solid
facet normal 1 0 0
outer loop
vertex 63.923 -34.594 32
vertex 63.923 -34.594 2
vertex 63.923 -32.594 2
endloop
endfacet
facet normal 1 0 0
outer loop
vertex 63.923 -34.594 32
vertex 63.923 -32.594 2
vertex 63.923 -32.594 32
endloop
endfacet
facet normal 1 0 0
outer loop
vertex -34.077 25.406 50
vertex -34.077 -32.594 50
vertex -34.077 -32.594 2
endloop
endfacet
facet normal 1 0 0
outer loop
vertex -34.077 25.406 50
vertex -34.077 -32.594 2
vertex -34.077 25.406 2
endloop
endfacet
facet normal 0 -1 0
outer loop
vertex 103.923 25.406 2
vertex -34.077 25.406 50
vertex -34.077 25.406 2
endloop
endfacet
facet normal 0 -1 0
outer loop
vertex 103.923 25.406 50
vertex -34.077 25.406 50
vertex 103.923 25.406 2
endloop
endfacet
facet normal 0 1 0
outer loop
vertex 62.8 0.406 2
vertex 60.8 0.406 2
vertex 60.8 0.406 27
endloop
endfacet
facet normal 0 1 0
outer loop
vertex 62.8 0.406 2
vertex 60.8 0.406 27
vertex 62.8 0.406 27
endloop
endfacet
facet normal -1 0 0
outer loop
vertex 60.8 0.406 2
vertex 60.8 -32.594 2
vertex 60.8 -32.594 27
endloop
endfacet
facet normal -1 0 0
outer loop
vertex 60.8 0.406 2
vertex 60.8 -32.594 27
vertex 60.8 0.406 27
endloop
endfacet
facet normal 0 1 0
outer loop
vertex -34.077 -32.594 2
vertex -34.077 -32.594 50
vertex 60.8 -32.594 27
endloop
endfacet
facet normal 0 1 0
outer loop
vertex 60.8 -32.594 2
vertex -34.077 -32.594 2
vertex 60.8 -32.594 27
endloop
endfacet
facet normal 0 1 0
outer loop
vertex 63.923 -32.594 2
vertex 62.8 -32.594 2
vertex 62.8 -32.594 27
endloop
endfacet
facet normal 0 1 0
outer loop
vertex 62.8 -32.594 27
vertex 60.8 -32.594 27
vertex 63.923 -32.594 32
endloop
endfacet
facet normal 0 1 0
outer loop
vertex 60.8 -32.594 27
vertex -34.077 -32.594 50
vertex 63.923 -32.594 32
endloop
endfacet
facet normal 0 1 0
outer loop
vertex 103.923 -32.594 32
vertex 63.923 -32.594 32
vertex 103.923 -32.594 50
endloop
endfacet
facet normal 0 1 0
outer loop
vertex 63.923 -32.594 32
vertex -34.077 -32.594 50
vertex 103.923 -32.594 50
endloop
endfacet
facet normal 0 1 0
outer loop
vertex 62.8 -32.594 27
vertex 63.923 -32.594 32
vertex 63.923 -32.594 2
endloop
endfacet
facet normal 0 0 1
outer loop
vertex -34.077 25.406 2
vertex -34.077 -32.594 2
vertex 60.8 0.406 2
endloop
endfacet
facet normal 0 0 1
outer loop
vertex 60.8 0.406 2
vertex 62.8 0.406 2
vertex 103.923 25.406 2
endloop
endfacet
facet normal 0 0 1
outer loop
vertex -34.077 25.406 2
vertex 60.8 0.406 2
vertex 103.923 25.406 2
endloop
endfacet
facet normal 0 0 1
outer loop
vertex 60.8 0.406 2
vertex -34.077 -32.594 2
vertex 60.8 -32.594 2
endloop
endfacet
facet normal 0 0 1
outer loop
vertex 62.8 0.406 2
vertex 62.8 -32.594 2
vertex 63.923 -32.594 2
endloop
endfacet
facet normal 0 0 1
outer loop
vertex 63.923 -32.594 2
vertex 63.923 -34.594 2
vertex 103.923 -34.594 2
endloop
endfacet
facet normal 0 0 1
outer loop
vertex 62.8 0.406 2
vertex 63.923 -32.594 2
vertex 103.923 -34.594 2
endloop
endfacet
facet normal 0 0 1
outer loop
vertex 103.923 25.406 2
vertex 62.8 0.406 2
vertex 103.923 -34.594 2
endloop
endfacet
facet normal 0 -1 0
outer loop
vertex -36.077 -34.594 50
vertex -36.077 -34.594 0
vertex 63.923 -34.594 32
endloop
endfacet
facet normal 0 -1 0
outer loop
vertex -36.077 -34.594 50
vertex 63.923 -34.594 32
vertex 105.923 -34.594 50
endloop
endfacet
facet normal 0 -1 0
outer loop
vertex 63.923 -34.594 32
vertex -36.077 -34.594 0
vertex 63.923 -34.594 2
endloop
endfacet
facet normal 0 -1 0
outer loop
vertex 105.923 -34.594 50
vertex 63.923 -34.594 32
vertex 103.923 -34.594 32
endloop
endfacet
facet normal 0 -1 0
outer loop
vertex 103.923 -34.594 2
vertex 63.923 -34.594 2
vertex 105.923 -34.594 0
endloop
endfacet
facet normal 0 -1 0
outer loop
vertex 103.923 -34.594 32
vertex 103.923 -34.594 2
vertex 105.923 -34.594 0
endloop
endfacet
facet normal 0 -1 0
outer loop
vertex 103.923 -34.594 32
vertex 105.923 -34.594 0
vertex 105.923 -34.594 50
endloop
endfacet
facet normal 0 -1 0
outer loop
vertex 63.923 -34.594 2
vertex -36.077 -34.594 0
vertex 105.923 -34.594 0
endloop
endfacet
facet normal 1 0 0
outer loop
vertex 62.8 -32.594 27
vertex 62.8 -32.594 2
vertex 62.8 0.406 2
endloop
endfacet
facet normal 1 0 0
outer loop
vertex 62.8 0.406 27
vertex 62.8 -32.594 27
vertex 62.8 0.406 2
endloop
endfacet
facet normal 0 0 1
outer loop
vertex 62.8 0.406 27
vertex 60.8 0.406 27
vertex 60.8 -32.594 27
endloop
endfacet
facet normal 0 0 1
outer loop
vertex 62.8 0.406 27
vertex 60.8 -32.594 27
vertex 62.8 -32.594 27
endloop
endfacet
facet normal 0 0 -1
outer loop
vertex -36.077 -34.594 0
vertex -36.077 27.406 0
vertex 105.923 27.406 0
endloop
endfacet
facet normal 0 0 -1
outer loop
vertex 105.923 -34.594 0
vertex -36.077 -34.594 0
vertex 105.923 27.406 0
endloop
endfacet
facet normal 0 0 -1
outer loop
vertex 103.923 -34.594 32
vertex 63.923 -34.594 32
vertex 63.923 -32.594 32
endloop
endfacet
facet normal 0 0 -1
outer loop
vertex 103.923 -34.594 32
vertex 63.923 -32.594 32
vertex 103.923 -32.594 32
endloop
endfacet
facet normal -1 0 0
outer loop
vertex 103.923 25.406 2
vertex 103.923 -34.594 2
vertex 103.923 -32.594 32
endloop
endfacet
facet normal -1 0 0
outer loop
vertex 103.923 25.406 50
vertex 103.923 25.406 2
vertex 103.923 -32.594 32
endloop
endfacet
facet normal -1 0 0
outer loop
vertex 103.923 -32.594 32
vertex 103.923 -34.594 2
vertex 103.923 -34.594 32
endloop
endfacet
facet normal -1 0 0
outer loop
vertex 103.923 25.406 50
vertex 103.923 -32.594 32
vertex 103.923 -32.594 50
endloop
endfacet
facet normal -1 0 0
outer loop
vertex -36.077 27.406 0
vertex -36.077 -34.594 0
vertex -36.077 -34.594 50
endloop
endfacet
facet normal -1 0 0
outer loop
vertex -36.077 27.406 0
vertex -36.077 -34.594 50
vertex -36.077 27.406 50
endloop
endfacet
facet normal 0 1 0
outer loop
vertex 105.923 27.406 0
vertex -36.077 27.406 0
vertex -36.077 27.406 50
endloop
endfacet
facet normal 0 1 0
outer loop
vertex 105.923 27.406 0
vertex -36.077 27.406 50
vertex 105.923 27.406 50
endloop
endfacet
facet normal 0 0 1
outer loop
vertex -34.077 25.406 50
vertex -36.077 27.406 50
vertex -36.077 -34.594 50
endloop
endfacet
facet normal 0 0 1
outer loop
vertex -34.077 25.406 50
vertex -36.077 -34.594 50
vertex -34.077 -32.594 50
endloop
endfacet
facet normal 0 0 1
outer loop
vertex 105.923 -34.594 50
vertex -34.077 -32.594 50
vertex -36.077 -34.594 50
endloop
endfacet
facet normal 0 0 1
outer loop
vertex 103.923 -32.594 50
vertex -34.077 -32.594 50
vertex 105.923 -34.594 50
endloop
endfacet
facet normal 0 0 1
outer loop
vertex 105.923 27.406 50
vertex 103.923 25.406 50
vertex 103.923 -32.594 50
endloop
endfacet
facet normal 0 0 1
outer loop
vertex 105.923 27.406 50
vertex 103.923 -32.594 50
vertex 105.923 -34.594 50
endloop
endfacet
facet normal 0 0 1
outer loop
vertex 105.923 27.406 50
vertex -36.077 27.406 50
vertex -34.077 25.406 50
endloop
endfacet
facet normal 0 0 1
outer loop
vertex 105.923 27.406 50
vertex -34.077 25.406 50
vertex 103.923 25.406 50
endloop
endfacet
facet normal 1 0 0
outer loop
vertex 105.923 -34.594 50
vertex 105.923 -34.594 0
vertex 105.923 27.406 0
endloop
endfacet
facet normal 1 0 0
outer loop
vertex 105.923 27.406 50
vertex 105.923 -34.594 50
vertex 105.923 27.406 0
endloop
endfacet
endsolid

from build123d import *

# Parameters (mm, degrees)
F0_W     = 142
F0_H     = 62
F1_DEPTH = 50
F2_W     = 138
F2_H     = 58
F3_DEPTH = 48
F6_W     = 40
F6_H     = 30
F7_DEPTH = 2
F8_W     = 2
F8_H     = 33
F9_DEPTH = 25


# Not quite as in the source:
# - a feature names something its author has since deleted; it is built from what else it names


with BuildPart() as f1:
    # F0 (on Top) → F1 (new body)
    with BuildSketch(Plane.XY):
        with Locations((34.9231133461, -3.5940962459)):
            Rectangle(F0_W, F0_H)
    extrude(amount=F1_DEPTH)

    # F2 (on face) → F3 (cut)
    with BuildSketch(Plane.XY.offset(50)):
        with Locations((34.9231133461, -3.5940962459)):
            Rectangle(F2_W, F2_H)
    extrude(amount=-F3_DEPTH, mode=Mode.SUBTRACT)

    # F6 (on face) → F7 (cut)
    with BuildSketch(Plane.XZ.offset(34.5940962459)):
        with Locations((83.9231133461, 17)):
            Rectangle(F6_W, F6_H)
    extrude(amount=-F7_DEPTH, mode=Mode.SUBTRACT)

    # F8 (on face) → F9 (join)
    with BuildSketch(Plane.XY.offset(2)):
        with Locations((61.7997199297, -16.0940962459)):
            Rectangle(F8_W, F8_H)
    extrude(amount=F9_DEPTH)


solid = f1.part
